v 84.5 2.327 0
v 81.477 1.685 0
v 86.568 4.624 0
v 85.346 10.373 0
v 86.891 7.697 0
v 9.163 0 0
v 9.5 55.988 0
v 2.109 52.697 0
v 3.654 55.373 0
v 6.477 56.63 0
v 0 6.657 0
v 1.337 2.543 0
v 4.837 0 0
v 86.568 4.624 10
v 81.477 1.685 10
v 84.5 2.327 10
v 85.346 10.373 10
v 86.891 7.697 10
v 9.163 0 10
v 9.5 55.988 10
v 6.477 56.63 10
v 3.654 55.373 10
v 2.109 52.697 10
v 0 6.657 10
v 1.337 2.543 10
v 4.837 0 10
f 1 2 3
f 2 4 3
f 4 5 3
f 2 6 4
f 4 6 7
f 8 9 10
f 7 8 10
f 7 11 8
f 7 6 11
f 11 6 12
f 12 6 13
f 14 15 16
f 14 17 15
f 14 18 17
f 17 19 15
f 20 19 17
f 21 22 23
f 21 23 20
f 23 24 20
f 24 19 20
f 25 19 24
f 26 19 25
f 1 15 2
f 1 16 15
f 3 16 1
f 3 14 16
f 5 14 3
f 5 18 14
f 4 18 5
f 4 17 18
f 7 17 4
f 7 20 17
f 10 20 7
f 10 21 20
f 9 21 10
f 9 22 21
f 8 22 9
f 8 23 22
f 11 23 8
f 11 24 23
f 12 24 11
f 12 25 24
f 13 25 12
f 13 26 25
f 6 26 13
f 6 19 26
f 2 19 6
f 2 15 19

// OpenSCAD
$fn = 32;

// ----------------------------------------------------------------------
// Lever arm: two bosses 14 and 10 mm, 75 mm between centres
// ----------------------------------------------------------------------

// --- parameters (mm) ---
profile_height = 10;      // extrusion height
profile_points = 13;      // points of the closed outline

profile = [[0, 6.657], [1.337, 2.543], [4.837, 0], [9.163, 0], [81.477, 1.685], [84.5, 2.327], [86.568, 4.624], [86.891, 7.697], [85.346, 10.373], [9.5, 55.988], [6.477, 56.63], [3.654, 55.373], [2.109, 52.697]];  // single closed polygon, 13 points, counter clockwise

// --- the one profile operation ---
linear_extrude(height = profile_height) polygon(points = profile);
